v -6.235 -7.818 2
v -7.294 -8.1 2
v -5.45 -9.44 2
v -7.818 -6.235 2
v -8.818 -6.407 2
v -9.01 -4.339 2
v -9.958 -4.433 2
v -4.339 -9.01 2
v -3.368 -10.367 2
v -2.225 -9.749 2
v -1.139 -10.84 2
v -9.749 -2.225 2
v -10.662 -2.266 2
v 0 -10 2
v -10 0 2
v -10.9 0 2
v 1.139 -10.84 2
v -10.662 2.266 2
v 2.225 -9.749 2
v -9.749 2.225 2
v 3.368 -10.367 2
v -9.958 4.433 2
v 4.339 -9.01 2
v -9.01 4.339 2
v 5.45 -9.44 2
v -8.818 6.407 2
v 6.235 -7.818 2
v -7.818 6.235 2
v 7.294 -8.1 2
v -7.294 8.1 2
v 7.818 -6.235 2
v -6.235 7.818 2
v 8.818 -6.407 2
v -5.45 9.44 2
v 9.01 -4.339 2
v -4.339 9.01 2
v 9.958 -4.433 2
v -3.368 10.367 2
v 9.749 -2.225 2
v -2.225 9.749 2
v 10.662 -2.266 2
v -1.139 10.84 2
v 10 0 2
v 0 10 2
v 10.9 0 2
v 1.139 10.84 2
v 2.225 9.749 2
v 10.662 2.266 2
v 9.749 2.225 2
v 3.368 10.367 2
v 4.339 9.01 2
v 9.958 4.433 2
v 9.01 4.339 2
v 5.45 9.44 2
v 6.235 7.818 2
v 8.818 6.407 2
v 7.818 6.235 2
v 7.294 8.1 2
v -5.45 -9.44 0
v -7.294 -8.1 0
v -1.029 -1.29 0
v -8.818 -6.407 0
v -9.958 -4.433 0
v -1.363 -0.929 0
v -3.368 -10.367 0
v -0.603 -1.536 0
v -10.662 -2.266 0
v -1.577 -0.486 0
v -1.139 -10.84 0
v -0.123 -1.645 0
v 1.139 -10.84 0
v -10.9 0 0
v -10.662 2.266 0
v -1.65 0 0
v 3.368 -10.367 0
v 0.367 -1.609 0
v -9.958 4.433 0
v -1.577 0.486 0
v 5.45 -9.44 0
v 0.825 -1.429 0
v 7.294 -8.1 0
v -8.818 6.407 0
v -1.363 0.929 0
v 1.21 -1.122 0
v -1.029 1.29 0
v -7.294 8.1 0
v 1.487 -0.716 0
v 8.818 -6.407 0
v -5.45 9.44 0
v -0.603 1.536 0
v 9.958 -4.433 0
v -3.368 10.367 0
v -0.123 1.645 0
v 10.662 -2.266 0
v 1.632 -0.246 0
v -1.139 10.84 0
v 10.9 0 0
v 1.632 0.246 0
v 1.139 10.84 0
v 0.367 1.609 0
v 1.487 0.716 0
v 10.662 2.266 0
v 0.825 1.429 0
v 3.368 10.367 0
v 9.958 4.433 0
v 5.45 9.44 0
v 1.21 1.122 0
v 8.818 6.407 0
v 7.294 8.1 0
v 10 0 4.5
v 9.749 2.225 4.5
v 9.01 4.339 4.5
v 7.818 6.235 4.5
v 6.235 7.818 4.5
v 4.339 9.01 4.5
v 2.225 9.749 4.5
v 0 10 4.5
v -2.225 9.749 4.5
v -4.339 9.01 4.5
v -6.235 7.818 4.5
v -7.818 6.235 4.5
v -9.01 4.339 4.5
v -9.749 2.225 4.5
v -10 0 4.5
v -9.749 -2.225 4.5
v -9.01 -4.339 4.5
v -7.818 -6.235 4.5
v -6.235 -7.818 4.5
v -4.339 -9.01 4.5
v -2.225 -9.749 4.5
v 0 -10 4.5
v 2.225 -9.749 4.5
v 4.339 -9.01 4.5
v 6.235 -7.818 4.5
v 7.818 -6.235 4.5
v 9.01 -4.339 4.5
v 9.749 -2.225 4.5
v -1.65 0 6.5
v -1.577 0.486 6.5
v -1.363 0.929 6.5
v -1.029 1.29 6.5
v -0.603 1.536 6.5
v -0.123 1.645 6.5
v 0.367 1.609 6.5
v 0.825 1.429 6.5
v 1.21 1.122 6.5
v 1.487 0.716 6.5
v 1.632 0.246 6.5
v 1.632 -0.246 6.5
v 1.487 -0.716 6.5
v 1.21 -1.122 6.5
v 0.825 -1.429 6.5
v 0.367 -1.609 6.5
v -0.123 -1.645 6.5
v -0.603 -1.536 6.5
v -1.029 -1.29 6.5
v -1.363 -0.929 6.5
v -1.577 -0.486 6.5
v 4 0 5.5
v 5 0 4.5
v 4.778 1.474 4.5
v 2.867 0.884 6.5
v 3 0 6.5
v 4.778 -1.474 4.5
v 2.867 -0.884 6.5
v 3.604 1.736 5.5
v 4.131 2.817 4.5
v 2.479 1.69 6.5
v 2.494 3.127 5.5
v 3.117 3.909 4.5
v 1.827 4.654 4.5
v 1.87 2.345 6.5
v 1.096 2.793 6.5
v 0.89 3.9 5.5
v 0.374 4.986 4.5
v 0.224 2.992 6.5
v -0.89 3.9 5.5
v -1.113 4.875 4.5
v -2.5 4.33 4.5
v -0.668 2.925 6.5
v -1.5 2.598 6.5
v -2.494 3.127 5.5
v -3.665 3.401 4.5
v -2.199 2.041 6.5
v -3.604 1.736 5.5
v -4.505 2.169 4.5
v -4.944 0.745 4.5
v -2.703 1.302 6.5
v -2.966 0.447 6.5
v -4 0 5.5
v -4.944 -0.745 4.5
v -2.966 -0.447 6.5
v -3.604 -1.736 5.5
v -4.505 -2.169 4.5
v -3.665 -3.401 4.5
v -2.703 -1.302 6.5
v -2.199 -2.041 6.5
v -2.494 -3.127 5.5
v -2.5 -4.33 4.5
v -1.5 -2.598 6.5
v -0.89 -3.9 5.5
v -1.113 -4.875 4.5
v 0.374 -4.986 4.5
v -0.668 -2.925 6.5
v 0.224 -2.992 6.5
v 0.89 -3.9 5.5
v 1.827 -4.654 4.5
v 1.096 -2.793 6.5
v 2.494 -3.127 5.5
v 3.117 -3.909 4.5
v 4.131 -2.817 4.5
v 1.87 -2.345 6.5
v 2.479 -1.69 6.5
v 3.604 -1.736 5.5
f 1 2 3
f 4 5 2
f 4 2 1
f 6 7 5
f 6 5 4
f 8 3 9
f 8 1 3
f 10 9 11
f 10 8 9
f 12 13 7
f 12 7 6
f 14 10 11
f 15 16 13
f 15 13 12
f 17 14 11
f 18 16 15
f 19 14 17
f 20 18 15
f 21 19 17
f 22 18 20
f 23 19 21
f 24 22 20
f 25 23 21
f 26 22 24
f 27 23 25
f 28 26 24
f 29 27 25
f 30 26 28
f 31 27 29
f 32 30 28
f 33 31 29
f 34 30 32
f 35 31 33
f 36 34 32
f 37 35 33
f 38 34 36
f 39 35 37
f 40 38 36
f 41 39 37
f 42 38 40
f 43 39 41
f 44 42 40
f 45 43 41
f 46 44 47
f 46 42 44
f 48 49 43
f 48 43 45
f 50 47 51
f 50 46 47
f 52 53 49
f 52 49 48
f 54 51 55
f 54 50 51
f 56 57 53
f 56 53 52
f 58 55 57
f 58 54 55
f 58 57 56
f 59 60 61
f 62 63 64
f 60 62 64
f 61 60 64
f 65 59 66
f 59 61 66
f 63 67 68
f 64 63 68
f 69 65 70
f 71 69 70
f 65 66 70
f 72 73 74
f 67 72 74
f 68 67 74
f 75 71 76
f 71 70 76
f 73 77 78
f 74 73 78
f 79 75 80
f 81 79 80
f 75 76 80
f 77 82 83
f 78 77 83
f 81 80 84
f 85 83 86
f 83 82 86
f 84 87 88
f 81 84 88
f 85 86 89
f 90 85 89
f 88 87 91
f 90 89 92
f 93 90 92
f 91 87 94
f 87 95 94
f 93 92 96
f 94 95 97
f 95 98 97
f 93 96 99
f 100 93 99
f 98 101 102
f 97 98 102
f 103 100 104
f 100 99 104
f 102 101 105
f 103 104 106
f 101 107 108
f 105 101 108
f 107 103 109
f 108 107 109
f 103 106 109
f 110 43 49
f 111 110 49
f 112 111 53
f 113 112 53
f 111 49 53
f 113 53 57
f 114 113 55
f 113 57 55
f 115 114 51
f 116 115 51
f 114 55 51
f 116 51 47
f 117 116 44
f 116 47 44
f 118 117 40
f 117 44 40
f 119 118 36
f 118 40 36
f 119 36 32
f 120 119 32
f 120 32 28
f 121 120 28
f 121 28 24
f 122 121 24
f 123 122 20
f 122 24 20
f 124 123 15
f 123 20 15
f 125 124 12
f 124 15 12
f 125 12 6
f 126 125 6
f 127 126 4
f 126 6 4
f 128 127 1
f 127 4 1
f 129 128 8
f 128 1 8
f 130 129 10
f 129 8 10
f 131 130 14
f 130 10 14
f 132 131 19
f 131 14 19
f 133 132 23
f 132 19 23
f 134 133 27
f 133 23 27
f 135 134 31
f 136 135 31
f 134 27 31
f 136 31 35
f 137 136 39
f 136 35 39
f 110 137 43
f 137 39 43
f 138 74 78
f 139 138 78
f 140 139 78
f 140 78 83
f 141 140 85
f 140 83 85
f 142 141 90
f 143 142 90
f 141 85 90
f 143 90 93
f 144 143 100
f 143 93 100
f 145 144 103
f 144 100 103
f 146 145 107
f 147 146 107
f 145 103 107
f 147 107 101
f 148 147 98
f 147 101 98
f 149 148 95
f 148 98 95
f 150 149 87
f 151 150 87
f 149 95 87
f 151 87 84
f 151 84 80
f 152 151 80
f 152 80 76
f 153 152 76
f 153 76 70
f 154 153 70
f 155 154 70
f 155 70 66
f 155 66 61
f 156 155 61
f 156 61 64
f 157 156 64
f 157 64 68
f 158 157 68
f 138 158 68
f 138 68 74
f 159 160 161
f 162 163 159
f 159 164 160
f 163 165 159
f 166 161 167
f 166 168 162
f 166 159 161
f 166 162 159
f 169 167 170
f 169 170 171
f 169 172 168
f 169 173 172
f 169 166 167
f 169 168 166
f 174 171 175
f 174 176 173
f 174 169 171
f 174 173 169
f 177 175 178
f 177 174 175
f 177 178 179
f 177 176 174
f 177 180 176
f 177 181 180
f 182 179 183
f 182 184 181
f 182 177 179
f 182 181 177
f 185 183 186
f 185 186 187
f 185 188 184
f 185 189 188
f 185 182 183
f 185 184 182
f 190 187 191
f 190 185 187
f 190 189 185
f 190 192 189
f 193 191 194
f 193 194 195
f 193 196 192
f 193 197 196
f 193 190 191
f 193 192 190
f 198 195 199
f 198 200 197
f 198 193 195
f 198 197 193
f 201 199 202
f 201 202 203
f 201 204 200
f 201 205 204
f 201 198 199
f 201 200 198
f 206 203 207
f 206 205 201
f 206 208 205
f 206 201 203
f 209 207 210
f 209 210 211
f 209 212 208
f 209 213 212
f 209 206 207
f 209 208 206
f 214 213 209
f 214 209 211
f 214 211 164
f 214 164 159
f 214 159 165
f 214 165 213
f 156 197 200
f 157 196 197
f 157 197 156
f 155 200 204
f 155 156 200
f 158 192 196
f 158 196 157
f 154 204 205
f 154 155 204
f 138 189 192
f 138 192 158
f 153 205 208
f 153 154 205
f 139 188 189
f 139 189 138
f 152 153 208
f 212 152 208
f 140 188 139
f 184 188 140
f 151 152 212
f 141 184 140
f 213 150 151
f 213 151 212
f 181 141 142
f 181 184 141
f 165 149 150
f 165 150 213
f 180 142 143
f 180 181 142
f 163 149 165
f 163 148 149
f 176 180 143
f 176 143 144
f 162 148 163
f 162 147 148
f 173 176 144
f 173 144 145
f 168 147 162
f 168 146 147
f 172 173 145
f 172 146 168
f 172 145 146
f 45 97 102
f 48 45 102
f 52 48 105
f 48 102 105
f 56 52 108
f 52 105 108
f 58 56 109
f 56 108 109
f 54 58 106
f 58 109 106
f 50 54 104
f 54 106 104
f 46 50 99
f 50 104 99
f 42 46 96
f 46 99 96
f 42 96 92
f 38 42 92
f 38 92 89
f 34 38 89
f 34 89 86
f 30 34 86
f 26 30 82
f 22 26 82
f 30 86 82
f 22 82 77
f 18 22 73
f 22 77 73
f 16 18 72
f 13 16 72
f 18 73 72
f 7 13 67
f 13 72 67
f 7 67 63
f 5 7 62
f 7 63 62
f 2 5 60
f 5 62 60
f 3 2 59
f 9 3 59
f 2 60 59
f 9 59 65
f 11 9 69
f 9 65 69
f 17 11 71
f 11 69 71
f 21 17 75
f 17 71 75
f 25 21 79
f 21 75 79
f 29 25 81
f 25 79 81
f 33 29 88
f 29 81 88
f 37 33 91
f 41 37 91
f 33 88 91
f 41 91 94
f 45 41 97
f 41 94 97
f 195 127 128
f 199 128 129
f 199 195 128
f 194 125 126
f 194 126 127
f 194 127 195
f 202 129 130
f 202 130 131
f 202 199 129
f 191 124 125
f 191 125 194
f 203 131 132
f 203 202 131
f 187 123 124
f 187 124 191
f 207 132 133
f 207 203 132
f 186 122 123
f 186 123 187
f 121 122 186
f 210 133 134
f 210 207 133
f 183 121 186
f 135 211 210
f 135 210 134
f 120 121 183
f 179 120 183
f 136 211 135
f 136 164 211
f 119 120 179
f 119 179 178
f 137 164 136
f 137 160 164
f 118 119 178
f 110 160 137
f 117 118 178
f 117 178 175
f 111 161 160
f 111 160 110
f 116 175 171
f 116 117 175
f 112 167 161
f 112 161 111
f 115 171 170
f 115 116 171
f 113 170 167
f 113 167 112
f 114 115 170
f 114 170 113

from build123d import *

# Parameters (mm, degrees)
SKETCH1_R           = 10.9
BOSS_EXTRUDE1_DEPTH = 2
SKETCH2_R           = 10
BOSS_EXTRUDE2_DEPTH = 2.5
SKETCH4_R           = 3
BOSS_EXTRUDE3_DEPTH = 2
SKETCH3_R           = 1.65
CUT_EXTRUDE1_DEPTH  = 17.729315587
CHAMFER1_SIZE       = 2


with BuildPart() as part:
    # Sketch1 → Boss-Extrude1 (new body)
    with BuildSketch(Plane.XY):
        Circle(SKETCH1_R)
    extrude(amount=BOSS_EXTRUDE1_DEPTH)

    # Sketch2 → Boss-Extrude2 (add)
    with BuildSketch(Plane.XY.offset(2)):
        Circle(SKETCH2_R)
    extrude(amount=BOSS_EXTRUDE2_DEPTH)

    # Sketch4 → Boss-Extrude3 (add)
    with BuildSketch(Plane.XY.offset(4.5)):
        Circle(SKETCH4_R)
    extrude(amount=BOSS_EXTRUDE3_DEPTH)

    # Sketch3 → Cut-Extrude1 (cut, through all)
    with BuildSketch(Plane(origin=(0, 0, 0), x_dir=(-1, 0, 0), z_dir=(0, 0, -1))):
        Circle(SKETCH3_R)
    extrude(amount=-CUT_EXTRUDE1_DEPTH, mode=Mode.SUBTRACT)

    # Chamfer1
    chamfer1_edges = [part.edges().sort_by_distance(p)[0] for p in [
        (-3, 0, 4.5),
    ]]
    chamfer(chamfer1_edges, length=CHAMFER1_SIZE - 0.0001)  # a hair under: the kernel refuses the full size


solid = part.part
